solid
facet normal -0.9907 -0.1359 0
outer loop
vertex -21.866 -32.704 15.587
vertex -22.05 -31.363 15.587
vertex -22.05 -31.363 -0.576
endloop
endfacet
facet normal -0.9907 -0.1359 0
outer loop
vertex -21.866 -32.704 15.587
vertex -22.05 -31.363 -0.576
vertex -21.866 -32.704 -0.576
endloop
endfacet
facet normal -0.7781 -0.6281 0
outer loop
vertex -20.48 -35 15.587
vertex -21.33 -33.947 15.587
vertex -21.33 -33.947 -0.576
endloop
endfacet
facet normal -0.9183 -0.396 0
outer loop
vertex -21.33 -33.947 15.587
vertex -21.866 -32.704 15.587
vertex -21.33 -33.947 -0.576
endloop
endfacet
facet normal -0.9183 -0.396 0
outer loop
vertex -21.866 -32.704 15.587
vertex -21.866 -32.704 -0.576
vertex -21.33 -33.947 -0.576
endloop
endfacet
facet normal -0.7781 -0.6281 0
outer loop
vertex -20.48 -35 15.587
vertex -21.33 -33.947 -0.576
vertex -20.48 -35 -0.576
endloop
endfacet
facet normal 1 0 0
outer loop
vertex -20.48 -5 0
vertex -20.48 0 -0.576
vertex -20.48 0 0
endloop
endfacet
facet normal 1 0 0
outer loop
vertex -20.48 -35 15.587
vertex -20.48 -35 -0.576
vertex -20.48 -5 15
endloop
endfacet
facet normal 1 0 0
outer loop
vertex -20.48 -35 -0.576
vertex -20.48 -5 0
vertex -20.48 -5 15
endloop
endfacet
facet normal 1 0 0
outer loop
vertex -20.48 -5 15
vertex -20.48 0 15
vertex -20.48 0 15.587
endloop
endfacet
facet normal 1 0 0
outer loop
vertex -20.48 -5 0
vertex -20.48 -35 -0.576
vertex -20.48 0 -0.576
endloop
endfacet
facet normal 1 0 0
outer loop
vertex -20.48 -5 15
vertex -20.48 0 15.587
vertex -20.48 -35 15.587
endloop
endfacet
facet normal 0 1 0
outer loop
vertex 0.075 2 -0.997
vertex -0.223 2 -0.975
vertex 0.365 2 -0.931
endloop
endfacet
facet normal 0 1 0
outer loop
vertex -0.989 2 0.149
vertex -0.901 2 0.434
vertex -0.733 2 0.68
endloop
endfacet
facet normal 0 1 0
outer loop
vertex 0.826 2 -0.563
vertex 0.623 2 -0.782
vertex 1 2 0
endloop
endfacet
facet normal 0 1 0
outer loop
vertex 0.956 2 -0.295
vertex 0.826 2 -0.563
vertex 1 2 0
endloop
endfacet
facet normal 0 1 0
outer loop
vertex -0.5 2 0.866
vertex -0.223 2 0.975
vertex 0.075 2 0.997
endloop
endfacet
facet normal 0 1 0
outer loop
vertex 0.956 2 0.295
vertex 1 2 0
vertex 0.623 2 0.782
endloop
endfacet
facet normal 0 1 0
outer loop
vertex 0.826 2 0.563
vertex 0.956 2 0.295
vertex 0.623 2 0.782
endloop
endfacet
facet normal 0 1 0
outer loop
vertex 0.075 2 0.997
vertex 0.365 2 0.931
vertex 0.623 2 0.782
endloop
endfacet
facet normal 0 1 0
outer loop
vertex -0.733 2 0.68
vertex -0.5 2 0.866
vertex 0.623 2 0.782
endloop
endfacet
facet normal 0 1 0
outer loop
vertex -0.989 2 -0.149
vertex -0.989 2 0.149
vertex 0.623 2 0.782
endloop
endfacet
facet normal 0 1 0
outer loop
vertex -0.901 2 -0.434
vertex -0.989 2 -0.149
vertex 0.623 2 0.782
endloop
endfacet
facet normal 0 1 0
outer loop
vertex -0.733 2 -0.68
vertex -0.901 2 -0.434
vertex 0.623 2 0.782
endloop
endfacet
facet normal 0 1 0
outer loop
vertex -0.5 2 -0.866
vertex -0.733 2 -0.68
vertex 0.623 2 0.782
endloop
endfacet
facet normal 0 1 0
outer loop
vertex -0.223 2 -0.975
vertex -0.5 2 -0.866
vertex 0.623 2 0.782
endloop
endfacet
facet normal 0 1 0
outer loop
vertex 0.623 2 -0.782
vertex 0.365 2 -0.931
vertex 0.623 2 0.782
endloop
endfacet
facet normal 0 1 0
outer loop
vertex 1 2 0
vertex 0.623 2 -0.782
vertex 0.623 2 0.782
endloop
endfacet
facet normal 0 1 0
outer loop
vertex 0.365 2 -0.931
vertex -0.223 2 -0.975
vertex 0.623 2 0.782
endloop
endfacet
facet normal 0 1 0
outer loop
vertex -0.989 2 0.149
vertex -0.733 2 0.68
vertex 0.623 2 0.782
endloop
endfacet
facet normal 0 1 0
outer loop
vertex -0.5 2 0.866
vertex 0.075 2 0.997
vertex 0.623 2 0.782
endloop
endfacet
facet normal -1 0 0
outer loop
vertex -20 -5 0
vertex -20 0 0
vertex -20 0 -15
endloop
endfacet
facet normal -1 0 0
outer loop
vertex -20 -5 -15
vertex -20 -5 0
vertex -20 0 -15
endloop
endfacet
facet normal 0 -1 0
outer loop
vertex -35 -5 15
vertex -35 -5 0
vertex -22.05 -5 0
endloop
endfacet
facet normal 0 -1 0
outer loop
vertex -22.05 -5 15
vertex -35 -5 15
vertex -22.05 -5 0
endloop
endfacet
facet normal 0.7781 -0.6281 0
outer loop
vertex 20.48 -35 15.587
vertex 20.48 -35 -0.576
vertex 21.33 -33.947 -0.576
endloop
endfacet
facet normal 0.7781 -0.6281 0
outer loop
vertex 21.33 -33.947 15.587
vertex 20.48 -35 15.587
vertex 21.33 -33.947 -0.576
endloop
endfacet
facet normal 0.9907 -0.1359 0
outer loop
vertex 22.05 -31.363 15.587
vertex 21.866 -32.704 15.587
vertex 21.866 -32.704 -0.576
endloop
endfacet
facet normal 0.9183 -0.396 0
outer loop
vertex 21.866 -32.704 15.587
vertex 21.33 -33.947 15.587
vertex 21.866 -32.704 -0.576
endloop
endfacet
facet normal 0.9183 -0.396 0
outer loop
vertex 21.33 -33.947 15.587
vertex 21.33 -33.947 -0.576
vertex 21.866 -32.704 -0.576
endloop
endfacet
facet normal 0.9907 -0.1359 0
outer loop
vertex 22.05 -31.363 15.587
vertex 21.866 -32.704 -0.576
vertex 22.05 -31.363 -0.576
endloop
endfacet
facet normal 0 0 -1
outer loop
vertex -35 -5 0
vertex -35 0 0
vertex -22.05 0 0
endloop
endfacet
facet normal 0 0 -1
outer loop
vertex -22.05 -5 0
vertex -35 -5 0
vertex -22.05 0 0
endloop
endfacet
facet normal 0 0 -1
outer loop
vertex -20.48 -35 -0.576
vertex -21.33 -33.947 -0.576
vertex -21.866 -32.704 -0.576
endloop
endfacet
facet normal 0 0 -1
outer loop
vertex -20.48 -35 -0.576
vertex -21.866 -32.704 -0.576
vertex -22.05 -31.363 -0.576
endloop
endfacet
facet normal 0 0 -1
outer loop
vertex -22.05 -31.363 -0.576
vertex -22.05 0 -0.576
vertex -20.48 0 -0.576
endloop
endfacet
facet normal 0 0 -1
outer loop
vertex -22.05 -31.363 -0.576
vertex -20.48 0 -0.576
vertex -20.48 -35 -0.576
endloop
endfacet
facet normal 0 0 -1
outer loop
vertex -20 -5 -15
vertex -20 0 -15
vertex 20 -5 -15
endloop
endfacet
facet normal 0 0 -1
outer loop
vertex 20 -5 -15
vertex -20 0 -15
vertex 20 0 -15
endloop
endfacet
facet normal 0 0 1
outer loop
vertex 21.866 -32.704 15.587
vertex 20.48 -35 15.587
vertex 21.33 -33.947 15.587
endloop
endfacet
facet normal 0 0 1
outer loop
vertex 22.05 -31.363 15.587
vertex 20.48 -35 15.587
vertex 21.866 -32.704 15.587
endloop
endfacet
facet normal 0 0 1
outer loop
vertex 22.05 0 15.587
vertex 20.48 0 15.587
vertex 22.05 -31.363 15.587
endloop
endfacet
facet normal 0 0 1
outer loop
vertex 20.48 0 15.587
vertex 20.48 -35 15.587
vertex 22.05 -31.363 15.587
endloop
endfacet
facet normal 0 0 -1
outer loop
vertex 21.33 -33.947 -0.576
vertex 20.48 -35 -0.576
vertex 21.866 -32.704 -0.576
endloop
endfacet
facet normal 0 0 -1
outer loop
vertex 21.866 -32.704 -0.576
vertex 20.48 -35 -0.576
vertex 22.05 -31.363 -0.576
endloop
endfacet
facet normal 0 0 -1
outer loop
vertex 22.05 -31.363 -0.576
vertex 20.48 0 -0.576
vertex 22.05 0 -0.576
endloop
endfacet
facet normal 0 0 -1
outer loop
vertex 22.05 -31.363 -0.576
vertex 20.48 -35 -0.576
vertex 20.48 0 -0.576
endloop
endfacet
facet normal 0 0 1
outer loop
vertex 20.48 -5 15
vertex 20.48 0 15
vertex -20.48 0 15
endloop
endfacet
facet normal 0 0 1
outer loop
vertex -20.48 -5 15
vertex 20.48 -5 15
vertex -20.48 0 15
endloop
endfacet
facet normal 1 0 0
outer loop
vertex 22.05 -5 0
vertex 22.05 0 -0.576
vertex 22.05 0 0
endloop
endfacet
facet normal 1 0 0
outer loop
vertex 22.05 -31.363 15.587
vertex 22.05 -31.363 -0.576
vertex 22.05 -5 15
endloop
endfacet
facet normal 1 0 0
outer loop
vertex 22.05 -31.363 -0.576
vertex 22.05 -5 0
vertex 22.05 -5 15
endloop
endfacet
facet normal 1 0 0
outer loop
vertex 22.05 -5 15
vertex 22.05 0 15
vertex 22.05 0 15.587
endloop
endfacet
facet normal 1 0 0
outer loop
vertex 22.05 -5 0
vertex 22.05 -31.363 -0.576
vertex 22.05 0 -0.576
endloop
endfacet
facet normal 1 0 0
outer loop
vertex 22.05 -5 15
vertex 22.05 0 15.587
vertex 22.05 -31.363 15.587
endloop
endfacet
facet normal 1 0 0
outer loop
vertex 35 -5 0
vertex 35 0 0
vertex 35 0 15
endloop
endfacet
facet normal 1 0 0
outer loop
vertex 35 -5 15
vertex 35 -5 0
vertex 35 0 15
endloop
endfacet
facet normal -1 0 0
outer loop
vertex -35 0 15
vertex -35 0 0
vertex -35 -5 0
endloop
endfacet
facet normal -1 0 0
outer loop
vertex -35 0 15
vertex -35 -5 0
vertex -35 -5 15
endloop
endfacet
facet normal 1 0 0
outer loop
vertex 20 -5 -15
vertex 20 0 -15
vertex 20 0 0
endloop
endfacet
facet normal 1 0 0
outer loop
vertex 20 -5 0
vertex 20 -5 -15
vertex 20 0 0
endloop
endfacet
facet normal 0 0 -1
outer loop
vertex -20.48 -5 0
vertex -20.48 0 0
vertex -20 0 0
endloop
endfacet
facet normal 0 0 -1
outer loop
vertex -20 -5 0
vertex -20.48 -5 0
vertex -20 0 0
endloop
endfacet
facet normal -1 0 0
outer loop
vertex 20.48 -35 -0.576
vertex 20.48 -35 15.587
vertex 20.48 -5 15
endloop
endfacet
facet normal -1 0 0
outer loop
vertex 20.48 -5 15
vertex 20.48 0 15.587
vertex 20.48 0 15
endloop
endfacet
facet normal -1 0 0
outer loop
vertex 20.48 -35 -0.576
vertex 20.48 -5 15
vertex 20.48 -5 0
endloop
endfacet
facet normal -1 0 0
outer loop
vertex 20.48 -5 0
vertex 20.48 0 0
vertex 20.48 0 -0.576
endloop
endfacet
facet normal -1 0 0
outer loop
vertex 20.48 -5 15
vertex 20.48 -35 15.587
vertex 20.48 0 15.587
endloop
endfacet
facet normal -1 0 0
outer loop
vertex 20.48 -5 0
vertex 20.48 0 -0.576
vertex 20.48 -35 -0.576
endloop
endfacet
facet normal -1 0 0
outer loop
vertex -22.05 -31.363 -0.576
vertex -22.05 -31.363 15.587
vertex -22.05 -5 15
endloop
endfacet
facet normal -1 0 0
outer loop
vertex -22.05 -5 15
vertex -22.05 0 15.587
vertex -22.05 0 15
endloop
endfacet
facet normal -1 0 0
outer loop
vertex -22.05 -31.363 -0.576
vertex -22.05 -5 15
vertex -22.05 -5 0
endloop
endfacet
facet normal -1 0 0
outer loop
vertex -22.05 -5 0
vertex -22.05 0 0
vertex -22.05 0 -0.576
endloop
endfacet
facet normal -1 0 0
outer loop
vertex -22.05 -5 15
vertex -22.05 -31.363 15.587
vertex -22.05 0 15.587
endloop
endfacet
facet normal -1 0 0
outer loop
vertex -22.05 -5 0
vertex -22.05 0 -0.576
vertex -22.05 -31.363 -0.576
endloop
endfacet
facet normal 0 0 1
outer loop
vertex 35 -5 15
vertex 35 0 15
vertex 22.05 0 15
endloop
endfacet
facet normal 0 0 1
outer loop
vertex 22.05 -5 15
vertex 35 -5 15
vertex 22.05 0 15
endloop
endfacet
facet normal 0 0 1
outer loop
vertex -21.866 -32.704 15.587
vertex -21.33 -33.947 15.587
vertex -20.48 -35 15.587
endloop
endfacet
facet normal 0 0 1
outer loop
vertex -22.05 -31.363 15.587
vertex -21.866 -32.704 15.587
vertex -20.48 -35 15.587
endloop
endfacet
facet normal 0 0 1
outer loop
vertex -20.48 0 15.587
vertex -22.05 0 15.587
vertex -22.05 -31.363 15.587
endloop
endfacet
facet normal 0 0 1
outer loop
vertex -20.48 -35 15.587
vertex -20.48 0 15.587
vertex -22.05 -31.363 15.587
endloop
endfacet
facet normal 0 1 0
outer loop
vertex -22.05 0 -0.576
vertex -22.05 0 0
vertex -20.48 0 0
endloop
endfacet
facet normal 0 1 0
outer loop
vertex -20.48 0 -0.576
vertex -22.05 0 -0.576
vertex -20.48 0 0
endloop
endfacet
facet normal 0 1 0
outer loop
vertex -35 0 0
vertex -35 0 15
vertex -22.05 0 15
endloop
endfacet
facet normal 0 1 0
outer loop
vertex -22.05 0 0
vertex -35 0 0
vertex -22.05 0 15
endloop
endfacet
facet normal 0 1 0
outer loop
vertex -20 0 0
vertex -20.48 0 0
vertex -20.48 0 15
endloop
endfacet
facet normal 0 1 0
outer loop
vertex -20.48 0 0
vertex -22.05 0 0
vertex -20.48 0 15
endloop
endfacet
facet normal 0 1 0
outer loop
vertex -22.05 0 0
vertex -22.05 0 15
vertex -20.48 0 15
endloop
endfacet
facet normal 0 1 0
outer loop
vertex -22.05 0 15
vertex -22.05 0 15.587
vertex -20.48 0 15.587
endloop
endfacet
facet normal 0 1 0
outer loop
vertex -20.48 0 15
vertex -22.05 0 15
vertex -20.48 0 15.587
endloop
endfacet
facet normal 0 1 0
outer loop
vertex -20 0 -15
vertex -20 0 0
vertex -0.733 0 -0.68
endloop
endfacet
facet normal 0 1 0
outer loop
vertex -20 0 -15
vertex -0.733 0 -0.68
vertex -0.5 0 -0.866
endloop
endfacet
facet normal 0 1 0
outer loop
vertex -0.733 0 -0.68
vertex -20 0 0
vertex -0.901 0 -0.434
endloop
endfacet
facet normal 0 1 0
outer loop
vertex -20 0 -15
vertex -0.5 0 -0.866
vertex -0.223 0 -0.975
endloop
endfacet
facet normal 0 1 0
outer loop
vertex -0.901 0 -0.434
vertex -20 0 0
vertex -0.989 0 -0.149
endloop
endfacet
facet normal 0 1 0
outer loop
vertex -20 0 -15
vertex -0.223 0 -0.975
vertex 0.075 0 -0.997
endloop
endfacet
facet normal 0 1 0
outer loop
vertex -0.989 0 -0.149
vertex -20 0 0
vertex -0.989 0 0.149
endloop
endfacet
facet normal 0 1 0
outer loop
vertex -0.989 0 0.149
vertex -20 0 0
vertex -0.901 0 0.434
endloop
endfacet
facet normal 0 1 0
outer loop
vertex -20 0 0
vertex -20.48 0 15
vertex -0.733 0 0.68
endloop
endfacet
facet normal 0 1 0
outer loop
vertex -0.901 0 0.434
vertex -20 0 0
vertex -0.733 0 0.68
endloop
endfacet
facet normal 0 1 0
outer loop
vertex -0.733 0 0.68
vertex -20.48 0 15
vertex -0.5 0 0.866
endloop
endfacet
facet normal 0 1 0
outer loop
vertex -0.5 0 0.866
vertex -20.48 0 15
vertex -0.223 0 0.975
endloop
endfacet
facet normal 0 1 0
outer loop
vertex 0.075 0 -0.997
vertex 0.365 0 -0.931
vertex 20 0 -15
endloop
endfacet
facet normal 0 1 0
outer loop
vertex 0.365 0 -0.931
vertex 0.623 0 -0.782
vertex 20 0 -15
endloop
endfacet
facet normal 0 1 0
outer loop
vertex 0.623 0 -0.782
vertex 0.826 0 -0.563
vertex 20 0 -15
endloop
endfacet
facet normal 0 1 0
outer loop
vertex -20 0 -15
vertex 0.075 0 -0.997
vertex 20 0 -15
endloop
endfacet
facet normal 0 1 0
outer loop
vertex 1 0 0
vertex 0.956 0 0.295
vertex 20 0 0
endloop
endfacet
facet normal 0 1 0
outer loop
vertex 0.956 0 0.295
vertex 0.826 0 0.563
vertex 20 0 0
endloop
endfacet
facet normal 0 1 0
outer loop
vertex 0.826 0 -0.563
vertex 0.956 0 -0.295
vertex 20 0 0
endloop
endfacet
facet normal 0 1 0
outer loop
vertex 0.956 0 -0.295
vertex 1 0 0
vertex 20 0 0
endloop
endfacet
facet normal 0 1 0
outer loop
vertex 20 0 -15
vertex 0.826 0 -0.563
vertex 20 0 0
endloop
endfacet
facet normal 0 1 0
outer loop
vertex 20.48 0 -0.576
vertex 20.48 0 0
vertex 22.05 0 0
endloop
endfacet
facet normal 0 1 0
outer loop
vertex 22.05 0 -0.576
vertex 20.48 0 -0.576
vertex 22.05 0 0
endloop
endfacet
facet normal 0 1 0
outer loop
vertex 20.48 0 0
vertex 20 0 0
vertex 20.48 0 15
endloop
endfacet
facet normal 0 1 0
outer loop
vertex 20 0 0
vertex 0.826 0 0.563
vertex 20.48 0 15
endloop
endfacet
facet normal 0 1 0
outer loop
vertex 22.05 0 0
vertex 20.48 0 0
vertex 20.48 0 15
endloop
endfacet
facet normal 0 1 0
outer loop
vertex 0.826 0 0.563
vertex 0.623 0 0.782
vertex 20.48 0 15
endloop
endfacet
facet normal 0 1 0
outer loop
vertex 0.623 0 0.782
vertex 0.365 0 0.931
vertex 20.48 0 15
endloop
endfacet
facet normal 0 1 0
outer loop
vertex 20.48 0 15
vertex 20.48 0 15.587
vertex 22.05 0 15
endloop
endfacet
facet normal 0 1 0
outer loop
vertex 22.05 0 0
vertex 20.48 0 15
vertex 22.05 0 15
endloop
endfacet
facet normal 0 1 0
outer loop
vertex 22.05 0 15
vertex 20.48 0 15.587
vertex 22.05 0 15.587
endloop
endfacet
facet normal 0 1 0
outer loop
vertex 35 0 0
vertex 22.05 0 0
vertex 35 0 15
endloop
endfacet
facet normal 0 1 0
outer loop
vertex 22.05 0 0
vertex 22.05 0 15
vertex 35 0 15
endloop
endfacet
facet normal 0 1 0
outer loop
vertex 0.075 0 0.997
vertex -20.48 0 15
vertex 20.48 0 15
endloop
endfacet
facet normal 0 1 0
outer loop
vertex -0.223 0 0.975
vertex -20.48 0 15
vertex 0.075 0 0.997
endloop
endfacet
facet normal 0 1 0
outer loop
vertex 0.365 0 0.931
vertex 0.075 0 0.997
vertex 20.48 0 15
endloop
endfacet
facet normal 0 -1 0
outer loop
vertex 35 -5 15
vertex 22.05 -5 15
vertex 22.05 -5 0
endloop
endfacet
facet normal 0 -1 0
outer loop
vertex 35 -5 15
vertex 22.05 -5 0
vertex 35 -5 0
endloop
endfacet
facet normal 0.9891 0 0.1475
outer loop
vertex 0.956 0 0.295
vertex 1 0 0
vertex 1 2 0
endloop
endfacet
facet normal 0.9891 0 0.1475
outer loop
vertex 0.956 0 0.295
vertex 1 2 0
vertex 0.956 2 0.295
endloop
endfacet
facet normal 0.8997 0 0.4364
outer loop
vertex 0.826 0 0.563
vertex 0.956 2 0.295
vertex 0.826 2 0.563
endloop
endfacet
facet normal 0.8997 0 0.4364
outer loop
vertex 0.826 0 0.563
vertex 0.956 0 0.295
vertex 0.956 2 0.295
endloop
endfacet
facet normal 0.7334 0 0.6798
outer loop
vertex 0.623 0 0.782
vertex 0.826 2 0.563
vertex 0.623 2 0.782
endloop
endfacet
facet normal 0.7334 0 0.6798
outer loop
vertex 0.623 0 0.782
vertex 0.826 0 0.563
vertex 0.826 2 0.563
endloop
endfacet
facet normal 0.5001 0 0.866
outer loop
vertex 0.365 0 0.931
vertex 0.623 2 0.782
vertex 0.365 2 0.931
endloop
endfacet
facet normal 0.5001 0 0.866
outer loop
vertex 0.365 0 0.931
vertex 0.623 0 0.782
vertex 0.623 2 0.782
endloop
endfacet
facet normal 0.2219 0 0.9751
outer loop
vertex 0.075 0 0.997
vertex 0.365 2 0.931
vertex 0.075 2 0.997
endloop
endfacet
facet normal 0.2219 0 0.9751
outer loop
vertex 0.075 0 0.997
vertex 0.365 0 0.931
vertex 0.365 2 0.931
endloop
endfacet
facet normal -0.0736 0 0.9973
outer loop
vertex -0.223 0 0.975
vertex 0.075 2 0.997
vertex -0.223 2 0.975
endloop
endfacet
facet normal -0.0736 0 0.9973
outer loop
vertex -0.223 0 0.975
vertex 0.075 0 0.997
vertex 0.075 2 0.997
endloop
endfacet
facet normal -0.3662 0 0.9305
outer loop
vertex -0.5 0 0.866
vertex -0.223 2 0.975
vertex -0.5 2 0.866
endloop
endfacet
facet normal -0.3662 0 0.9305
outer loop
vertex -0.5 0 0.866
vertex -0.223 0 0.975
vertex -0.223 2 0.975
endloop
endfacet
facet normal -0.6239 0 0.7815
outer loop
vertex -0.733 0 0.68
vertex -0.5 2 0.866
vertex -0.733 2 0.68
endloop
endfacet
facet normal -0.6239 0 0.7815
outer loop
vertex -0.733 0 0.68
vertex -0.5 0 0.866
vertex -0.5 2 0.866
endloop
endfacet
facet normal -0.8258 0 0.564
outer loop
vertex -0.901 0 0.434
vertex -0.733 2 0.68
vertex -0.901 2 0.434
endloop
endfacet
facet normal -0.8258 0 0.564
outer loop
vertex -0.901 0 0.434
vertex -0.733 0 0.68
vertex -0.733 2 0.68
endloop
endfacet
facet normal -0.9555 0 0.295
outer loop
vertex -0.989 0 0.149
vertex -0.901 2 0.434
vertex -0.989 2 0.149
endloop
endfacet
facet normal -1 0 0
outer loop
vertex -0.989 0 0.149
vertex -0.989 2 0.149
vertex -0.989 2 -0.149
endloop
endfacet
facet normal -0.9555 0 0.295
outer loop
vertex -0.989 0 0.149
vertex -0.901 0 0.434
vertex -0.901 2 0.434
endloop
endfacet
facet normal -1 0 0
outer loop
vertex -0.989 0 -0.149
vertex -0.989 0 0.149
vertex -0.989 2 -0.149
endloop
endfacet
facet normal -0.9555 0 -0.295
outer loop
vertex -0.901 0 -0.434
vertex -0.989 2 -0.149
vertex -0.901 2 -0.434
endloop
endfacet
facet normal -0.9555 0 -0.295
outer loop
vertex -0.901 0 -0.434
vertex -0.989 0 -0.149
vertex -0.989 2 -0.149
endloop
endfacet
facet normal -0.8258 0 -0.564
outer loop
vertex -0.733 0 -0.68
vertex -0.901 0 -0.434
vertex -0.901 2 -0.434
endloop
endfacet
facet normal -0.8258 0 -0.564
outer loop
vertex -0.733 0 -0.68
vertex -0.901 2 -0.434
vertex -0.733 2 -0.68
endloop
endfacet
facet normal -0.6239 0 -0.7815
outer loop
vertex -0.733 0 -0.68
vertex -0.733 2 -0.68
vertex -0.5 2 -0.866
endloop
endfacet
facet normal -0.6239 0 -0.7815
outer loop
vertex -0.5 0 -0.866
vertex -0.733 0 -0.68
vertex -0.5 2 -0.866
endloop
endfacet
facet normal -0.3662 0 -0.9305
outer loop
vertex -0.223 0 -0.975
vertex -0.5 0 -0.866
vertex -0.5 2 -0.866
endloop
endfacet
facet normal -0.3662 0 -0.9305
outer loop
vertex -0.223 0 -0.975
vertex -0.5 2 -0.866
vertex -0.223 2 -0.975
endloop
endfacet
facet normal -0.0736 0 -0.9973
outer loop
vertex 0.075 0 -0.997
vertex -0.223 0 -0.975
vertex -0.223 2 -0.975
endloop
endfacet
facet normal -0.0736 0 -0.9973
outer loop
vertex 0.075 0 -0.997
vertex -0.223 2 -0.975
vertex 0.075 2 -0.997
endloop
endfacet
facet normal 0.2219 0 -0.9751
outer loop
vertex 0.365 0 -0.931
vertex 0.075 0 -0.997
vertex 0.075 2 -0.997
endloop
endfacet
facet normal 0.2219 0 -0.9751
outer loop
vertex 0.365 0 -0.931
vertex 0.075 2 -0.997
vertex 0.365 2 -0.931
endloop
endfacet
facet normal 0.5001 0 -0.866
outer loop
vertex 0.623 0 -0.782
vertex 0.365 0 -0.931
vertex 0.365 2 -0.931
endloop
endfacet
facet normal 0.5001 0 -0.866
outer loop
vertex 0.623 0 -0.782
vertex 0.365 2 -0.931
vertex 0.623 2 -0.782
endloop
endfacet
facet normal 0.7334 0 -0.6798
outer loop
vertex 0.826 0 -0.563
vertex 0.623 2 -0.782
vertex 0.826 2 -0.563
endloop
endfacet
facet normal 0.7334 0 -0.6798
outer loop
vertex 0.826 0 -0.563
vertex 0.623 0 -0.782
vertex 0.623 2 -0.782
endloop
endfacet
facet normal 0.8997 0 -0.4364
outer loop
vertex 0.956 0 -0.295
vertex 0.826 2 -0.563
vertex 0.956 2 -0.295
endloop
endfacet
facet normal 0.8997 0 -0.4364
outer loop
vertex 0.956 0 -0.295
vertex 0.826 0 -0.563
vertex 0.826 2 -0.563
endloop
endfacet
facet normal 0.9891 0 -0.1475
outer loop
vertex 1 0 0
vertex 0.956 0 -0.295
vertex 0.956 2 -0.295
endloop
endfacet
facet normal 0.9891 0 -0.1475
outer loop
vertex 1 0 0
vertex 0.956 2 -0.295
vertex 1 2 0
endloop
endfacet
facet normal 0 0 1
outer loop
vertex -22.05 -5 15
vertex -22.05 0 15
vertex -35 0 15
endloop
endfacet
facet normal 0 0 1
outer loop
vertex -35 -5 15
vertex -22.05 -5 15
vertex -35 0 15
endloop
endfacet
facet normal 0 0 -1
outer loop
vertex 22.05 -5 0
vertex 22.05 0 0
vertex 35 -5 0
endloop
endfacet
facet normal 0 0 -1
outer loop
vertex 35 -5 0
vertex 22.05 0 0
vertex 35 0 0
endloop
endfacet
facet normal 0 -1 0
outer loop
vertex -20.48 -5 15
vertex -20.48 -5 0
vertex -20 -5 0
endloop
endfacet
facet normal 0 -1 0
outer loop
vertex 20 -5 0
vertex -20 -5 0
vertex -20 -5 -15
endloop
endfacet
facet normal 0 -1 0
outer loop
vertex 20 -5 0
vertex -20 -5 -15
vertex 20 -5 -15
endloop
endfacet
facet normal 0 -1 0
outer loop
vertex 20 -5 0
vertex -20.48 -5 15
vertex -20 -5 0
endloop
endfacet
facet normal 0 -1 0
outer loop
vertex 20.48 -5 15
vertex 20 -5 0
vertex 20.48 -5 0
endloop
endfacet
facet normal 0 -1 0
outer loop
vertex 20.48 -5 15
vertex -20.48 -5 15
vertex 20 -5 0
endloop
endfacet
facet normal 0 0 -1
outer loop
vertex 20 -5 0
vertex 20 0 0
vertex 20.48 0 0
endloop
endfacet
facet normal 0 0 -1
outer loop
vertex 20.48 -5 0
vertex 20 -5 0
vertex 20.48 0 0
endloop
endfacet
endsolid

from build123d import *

# Parameters (mm, degrees)
F0_W        = 12.9503121972
F0_H        = 15
F0_R        = 1
F0_W_2      = 1.5692040324
F1_DEPTH    = 5
F2_DEPTH    = 2
F0_H_2      = 0.5759084597
F0_H_3      = 0.5869377777
F3_DEPTH    = 35
F4_T1_DEPTH = 34.3491316119


# Not quite as in the source:
# - a fillet or chamfer that OpenCascade refuses, or shapes differently, is made with other operations: its cross-section is extruded or revolved along the edge and cut away or added
# - a feature names something its author has since deleted; it is built from what else it names


with BuildPart() as f1:
    # F0 (on Front) → F1 (new body)
    with BuildSketch(Plane.XZ):
        with Locations((-28.5248439014, 7.5)):
            Rectangle(F0_W, F0_H)
        Polygon((20.4804837704, 0), (20.4804837704, 15), (-20.4804837704, 15), (-20.4804837704, 0), (-20, 0), (-20, -15), (20, -15), (20, 0), align=None)
        Circle(F0_R, mode=Mode.SUBTRACT)
        with Locations((-21.2650857866, 7.5)):
            Rectangle(F0_W_2, F0_H)
        with Locations((21.2650857866, 7.5)):
            Rectangle(F0_W_2, F0_H)
        with Locations((28.5248439014, 7.5)):
            Rectangle(F0_W, F0_H)
        Circle(F0_R)
    extrude(amount=F1_DEPTH)

    # F0 (on Front) → F2 (join)
    with BuildSketch(Plane.XZ):
        Circle(F0_R)
    extrude(amount=-F2_DEPTH)

    # F0 (on Front) → F3 (join)
    with BuildSketch(Plane.XZ):
        with Locations((-21.2650857866, 7.5)):
            Rectangle(F0_W_2, F0_H)
        with Locations((-21.2650857866, -0.2879542299)):
            Rectangle(F0_W_2, F0_H_2)
        with Locations((-21.2650857866, 15.2934688888)):
            Rectangle(F0_W_2, F0_H_3)
        with Locations((21.2650857866, 15.2934688888)):
            Rectangle(F0_W_2, F0_H_3)
        with Locations((21.2650857866, 7.5)):
            Rectangle(F0_W_2, F0_H)
        with Locations((21.2650857866, -0.2879542299)):
            Rectangle(F0_W_2, F0_H_2)
    extrude(amount=F3_DEPTH)

    # F4: fillet of radius 5 on 2 edges, made by hand

    # F4_s2 → F4_t1 (cut)
    with BuildSketch(Plane.XY.offset(-9.669051147)):
        with BuildLine():
            ThreePointArc((-22.0496878028, -31.3627429251), (-21.6406561014, -33.3434019268), (-20.4804837704, -35))
            Line((-20.4804837704, -35), (-22.0496878028, -35))
            Line((-22.0496878028, -35), (-22.0496878028, -31.3627429251))
        make_face()
        with BuildLine():
            ThreePointArc((20.4804837704, -35), (21.6406561014, -33.3434019268), (22.0496878028, -31.3627429251))
            Line((22.0496878028, -31.3627429251), (22.0496878028, -35))
            Line((22.0496878028, -35), (20.4804837704, -35))
        make_face()
    extrude(amount=F4_T1_DEPTH, mode=Mode.SUBTRACT)


solid = f1.part
